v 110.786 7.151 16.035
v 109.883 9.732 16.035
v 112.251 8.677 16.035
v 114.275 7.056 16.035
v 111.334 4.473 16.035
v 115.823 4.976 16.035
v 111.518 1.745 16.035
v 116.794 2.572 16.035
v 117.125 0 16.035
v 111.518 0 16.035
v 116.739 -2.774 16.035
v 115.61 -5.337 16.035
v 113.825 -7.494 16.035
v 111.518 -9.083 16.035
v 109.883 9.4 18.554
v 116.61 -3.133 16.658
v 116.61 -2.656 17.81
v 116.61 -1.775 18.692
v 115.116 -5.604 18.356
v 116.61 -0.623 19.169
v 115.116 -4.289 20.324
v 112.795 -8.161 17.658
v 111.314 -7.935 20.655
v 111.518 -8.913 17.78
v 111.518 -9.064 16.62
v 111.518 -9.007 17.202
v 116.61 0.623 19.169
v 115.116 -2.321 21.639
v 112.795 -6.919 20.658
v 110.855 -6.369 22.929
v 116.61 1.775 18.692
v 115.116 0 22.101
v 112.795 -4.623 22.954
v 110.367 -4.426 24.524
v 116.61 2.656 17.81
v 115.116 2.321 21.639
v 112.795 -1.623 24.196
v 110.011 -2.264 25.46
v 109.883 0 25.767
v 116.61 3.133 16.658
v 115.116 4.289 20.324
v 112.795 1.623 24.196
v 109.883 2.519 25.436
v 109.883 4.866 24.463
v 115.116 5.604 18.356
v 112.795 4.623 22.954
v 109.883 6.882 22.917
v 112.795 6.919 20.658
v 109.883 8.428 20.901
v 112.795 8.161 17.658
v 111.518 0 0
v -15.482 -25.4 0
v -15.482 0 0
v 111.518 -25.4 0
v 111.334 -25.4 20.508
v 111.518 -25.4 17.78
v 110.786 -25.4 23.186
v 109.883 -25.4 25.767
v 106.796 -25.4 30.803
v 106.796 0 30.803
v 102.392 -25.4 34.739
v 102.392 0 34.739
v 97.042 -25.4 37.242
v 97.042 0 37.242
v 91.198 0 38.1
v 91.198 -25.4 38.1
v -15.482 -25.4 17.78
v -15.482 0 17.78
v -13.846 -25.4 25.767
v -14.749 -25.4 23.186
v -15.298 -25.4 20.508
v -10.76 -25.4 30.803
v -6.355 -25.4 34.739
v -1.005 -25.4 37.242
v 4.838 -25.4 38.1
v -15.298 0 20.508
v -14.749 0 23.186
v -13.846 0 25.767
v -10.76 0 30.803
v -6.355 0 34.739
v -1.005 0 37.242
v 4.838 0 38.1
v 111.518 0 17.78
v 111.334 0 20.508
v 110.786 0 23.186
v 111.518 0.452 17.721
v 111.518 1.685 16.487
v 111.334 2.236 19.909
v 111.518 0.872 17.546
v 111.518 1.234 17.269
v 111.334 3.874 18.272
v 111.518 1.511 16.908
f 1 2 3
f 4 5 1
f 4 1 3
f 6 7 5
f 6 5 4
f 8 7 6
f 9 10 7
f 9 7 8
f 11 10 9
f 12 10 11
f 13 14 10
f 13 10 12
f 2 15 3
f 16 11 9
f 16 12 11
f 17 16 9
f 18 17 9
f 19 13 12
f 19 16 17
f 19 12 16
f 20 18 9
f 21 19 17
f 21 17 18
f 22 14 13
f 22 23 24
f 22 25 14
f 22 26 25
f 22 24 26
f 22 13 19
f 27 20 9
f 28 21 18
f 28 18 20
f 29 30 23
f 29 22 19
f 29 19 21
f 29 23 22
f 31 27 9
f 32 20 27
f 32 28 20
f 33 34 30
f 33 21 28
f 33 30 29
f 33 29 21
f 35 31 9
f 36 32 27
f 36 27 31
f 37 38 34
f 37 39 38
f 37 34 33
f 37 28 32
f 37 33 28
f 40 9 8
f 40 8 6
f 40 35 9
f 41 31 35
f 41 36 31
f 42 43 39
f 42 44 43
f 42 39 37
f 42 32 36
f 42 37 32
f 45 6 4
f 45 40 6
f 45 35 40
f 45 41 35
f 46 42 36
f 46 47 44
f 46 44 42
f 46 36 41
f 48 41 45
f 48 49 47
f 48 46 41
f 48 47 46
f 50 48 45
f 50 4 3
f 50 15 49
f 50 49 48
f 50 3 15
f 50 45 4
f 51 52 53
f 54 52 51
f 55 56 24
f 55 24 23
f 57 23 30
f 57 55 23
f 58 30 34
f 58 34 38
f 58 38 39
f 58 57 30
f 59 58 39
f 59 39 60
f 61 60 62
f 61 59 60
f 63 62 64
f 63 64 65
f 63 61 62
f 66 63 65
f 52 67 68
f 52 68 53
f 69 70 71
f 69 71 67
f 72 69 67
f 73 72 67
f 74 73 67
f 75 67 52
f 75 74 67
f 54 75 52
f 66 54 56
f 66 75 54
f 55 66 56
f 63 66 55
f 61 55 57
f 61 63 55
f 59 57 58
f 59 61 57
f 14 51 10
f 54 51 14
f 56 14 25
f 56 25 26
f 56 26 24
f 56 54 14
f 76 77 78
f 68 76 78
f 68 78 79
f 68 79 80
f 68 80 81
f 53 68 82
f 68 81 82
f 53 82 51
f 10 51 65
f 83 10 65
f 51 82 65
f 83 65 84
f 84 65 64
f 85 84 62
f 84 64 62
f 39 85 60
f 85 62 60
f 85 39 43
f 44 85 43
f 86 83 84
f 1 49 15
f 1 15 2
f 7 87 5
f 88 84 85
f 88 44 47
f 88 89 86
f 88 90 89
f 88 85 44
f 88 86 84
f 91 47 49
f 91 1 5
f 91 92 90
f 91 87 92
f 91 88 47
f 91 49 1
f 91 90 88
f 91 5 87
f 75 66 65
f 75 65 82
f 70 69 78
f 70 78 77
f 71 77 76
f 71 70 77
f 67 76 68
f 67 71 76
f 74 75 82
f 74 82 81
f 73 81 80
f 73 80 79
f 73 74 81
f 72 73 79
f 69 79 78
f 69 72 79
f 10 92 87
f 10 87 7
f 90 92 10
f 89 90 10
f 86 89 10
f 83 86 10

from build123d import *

# Parameters (mm, degrees)
F3_DEPTH      = 25.4
F4_ANGLE_BACK = 90
F4_ANGLE      = 180


with BuildPart() as f3:
    # F2 (on offset) → F3 (new body)
    with BuildSketch(Plane.XZ.offset(25.4)):
        with BuildLine():
            Line((111.518352419, 2.54), (111.518352419, 17.78))
            ThreePointArc((111.518352419, 17.78), (111.1052602487, 21.8564470631), (109.8827795196, 25.7671511769))
            ThreePointArc((109.8827795196, 25.7671511769), (102.3921785764, 34.7387928803), (91.198352419, 38.1))
            Line((91.198352419, 38.1), (4.838352419, 38.1))
            ThreePointArc((4.838352419, 38.1), (-6.3554737384, 34.7387928803), (-13.8460746816, 25.7671511769))
            ThreePointArc((-13.8460746816, 25.7671511769), (-15.0685554108, 21.8564470631), (-15.481647581, 17.78))
            Line((-15.481647581, 17.78), (-15.481647581, 16.035139312))
            Line((-15.481647581, 16.035139312), (-15.481647581, 0))
            Line((-15.481647581, 0), (111.518352419, 0))
            Line((111.518352419, 0), (111.518352419, 2.54))
        make_face()
    extrude(amount=-F3_DEPTH)

    # F0 (on Front) → F4 (revolve)
    with BuildSketch(Plane.XZ, mode=Mode.PRIVATE) as f4_sk:
        with BuildLine():
            ThreePointArc((117.1249815379, 16.035139312), (115.1157614851, 22.1006472259), (109.8827795196, 25.7671511769))
            ThreePointArc((109.8827795196, 25.7671511769), (111.1052602487, 21.8564470631), (111.518352419, 17.78))
            Line((111.518352419, 17.78), (111.518352419, 16.035139312))
            Line((111.518352419, 16.035139312), (117.1249815379, 16.035139312))
        make_face()
    revolve(f4_sk.sketch.rotate(Axis((114.3216669785, 0, 16.035139312), (-1, 0, 0)), -F4_ANGLE_BACK), axis=Axis((114.3216669785, 0, 16.035139312), (-1, 0, 0)), revolution_arc=F4_ANGLE)


solid = f3.part
